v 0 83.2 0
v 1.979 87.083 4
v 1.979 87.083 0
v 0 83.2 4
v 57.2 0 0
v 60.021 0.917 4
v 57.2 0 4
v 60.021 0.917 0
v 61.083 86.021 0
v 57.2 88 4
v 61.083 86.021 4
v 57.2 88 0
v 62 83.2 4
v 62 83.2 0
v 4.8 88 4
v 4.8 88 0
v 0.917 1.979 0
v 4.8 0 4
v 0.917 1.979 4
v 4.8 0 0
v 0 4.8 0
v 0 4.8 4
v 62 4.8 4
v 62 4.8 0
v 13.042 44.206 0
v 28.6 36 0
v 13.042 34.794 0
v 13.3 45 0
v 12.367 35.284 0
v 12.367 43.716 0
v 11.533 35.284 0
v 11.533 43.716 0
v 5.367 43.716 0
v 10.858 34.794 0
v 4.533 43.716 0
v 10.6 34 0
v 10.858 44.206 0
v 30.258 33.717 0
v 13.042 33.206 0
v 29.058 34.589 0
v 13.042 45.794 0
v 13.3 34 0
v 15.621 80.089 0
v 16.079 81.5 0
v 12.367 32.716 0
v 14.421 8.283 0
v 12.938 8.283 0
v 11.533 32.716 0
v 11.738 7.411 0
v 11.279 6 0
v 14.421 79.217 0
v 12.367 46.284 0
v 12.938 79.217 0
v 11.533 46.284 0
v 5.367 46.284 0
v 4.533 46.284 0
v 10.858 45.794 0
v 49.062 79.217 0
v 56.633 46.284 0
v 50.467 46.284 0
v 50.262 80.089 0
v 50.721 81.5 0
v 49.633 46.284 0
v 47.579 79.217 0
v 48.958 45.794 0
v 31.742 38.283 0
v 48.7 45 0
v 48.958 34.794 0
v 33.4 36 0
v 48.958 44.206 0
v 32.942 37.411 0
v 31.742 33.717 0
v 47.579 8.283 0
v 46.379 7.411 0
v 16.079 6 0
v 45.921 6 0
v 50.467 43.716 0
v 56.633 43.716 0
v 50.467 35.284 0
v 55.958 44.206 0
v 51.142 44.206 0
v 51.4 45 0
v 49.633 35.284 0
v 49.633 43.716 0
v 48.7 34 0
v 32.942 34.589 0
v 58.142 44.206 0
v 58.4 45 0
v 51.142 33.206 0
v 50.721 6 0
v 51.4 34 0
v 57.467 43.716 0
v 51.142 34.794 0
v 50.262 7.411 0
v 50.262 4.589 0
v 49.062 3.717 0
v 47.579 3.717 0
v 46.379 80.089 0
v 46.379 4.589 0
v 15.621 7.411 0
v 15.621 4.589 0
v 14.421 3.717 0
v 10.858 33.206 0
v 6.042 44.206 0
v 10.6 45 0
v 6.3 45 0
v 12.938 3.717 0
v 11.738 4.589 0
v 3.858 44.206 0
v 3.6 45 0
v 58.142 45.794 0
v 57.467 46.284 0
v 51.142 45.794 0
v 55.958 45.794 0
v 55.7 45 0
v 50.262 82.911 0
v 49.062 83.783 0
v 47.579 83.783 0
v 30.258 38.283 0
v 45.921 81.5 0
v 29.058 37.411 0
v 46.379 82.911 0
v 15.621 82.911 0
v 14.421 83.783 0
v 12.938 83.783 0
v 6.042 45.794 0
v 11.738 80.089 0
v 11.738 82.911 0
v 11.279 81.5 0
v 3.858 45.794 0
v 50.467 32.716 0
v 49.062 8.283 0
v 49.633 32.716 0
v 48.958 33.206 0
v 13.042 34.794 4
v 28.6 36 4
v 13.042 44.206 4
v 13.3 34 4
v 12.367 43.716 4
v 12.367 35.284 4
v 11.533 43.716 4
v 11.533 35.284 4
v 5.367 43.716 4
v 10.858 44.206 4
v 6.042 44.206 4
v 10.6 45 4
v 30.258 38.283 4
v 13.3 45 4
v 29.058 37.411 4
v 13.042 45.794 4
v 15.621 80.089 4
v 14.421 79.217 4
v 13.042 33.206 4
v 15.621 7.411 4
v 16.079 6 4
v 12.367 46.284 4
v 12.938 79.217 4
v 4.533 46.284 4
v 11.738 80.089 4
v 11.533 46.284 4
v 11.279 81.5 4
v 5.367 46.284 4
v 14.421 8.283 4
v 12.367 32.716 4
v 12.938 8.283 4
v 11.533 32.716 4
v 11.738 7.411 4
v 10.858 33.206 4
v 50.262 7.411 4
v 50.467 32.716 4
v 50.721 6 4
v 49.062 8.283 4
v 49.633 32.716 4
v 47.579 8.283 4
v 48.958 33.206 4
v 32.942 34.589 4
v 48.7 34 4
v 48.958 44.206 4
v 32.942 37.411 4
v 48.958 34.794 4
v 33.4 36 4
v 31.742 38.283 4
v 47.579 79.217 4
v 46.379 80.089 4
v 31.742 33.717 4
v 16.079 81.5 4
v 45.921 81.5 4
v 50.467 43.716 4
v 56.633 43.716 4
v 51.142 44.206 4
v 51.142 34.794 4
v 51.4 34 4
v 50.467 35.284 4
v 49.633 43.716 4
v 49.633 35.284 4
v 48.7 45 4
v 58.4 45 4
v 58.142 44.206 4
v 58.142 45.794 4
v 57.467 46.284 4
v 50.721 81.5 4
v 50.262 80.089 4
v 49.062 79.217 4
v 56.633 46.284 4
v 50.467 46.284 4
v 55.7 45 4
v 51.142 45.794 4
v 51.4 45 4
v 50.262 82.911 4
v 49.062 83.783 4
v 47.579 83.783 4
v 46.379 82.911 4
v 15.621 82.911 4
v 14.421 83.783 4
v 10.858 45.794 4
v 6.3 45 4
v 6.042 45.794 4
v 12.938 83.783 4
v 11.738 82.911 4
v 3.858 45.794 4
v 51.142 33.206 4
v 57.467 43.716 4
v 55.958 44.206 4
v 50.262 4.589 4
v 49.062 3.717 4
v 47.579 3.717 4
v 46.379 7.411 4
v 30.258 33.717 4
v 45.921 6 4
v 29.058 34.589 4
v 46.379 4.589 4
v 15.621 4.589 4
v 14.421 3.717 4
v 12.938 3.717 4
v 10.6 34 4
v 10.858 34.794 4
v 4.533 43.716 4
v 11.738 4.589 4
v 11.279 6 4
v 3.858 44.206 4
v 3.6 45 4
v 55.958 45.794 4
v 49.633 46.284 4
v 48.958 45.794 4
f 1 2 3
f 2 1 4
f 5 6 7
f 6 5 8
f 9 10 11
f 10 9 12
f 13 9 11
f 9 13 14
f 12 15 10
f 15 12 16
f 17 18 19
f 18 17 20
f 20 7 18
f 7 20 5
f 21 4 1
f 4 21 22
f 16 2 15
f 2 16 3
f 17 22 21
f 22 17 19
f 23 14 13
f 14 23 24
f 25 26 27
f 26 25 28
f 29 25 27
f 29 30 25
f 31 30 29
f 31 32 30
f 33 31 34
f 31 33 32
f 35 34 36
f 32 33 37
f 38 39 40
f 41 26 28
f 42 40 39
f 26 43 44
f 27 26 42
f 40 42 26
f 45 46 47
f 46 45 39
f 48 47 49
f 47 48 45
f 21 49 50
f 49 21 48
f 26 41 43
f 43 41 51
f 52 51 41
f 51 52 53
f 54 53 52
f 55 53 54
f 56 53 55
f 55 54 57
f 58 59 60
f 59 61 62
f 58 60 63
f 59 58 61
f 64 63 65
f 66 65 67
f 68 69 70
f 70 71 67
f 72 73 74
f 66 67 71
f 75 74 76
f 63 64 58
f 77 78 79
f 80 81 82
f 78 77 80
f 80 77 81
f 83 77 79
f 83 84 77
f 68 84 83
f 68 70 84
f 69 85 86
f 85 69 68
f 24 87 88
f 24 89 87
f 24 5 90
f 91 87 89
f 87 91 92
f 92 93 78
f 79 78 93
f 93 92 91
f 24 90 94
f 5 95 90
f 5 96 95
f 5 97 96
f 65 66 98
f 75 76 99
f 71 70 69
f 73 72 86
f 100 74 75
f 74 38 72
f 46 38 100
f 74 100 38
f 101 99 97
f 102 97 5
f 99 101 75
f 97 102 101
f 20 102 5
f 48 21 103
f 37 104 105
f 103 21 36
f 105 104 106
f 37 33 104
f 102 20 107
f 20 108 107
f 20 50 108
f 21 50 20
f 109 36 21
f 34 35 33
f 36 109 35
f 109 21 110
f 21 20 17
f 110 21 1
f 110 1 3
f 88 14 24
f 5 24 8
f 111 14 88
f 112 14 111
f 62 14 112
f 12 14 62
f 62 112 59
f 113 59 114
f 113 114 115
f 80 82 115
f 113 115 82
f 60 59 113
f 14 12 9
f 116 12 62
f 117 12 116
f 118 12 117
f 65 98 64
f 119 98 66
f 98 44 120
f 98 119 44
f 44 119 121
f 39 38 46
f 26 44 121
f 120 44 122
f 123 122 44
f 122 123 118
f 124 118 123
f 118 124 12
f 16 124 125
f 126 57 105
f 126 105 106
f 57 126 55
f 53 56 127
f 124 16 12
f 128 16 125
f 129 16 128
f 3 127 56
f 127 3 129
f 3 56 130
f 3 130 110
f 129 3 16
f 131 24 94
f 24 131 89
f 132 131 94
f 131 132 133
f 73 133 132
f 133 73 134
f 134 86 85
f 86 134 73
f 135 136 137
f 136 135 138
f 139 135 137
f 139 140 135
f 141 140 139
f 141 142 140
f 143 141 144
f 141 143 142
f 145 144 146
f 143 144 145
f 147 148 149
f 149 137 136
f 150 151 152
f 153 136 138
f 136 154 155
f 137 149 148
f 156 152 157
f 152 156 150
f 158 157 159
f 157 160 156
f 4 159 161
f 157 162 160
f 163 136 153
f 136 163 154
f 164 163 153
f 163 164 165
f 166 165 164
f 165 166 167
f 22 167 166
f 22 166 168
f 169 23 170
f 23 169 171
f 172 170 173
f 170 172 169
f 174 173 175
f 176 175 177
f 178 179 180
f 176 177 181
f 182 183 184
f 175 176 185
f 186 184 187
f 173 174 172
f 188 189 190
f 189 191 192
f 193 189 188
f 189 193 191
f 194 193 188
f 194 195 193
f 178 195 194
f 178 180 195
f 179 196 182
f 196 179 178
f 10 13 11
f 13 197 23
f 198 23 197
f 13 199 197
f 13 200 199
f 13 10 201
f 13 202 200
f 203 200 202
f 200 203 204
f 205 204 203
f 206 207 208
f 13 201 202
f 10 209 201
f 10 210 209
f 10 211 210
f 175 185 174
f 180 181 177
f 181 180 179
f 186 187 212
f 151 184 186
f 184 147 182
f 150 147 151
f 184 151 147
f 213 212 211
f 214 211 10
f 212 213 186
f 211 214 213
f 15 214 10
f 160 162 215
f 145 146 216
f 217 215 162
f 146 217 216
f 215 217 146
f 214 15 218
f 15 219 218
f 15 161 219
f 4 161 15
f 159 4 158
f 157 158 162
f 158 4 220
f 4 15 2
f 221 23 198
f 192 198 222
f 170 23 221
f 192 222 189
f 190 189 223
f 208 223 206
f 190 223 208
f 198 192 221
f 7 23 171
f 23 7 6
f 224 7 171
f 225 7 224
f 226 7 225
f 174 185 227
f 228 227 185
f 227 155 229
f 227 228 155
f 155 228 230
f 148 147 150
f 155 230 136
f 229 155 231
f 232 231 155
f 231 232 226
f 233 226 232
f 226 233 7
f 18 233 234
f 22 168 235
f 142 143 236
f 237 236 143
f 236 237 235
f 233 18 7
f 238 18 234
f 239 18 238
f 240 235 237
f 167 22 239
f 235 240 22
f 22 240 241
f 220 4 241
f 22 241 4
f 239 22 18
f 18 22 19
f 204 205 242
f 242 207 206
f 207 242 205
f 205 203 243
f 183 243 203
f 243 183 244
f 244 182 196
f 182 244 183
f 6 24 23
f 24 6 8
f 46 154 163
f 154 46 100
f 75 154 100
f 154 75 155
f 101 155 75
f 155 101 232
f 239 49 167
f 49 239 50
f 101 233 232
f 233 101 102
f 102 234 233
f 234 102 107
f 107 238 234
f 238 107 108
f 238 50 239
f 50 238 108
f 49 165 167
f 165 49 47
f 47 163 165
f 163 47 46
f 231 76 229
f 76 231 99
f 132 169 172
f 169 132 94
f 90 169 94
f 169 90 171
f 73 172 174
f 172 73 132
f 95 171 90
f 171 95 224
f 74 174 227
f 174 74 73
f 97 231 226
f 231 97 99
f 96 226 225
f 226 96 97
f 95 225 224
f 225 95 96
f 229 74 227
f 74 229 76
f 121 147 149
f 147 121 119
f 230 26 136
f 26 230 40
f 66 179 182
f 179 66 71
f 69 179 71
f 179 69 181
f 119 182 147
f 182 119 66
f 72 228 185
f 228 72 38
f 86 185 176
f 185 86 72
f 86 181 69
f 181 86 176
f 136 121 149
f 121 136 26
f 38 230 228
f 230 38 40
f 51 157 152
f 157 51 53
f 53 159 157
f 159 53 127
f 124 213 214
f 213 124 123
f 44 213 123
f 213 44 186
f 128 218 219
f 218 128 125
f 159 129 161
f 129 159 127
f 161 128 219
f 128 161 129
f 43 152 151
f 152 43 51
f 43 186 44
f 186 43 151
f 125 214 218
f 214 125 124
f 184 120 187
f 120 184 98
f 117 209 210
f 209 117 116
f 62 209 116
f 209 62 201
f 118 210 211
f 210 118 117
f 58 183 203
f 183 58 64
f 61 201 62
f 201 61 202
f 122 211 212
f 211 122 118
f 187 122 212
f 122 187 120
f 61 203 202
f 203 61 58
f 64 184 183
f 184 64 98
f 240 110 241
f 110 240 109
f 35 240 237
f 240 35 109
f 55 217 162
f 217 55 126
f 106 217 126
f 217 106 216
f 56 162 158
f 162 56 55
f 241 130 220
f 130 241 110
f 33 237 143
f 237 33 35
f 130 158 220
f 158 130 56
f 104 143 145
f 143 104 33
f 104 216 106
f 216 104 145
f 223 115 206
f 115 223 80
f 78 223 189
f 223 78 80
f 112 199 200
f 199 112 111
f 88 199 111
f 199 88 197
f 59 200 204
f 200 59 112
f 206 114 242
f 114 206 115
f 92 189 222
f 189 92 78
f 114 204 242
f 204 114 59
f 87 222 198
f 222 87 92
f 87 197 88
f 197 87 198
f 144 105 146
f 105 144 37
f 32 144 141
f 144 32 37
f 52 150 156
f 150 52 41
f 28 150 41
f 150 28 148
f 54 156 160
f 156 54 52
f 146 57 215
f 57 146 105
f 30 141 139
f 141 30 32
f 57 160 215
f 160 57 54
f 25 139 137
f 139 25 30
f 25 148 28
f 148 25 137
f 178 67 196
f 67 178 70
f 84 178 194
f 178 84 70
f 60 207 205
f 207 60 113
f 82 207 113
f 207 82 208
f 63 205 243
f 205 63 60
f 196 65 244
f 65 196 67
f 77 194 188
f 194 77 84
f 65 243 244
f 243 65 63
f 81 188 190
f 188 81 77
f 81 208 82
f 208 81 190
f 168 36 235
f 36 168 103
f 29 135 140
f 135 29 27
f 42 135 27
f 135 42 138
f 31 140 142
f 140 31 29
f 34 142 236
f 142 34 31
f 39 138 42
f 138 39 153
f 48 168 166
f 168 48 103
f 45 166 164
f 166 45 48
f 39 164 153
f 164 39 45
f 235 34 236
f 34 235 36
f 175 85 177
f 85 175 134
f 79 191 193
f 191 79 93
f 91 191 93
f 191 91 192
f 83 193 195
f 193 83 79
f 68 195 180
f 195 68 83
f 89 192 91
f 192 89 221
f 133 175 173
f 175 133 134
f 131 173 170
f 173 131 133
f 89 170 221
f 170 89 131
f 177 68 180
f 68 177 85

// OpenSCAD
// Set to 'preview' while changing paramters. Set to 'create' before clicking 'Create Thing'. Rendering will fail (timeout will be displayed), but export will work!
create_thing=0; // [0:preview, 1:create]

// center distance of the wheels
wheeldistance=30;

// center distance of the rods.
roddistance=45.5;

// CR10/mk8 mounting block
include_CR10_mount = 0; // [0:no, 1:yes]
// BLTouch mount
include_BLTouch = 0; // [0:no, 1:yes]
// E3D mount
include_E3D_mount = 0; // [0:no, 1:yes]
// Add a sensor holder to the carriage (if activated: print with support advised!) - ATTENTION: Depending on the position of your sensor holder, it may interfere with other components (e.g. cooling fan of hotend, cable chain, ...) -> Based on this fact, the sensor holder on the back of the carriage is still the recommended version (links can be found in the thing-description.)
include_sensor_holder = 0; // [0:no, 1:yes]
// E3D side fan holder
include_fan_holder = 0; // [0:no, 1:yes]

/* [Hidden] */

plate=1;
beltholder=2;
full=3;

view=1;

$fn= create_thing?50:10;

width=62;
height=88;
thickness_backplate=4;

/* [CR10-mount] */

// left/right on plate
mount_x=-20.5; // [-30:-10]
// up/down on plate
mount_y=16;    // [10:20]
// depth(height) of the mounting block
mount_depth=6; // [5:10]

/* [BLTouch] */

// left/right on plate
sensor_x=20.5;       // [10:30]
// up/down on plate
sensor_y=16;         // [10:20]

/* [E3D-mount] */

// X-Offset of hotend mounting point in mm (0mm recommended)
x_offset_hotend = 0;  // [-8:0.1:8]

// Total height of hotend (top to nozzle tip) in mm (E3Dv6: ~63mm, Some Clones: ~74mm)
hotend_height = 63; // [60:85]

/* [Fan-Holder] */

// Zip tie hole on fan holder
zip_tie_hole_fan_holder = 1; // [0:no, 1:yes]

// Fan holder offset in z-direction in mm (printer coordinate system - up/down)
z_offset_fan_holder = 0;  // [-3:0.1:10]

// Fan holder offset in x-direction in mm (printer coordinate system - left/right)
x_offset_fan_holder = 0;  // [-10:0.1:3]

// Fan holder offset in y-direction in mm (printer coordinate system - back/forth)
y_offset_fan_holder = 0; // [-10:0.1:6]

/* [Sensor-Holder] */

// X-Offset of sensor holder mounting point in mm (>0mm recommended)
x_offset_sensor = 0; // [-8:0.1:20]

// Y-Offset of sensor holder mounting point in mm (0mm recommended)
y_offset_sensor = 0; // [-2:0.1:20]

// Z-Offset of sensor holder mounting point in mm
z_offset_sensor = 0; // [-12:0.1:15]

// Select your sensor diameter (Most common: M18, M12, M8)
sensor_diameter = 18; //[6:1:20]

// Height/thickness of the sensor holder (default: 8mm)
sensor_holder_height = 8; //[5:0.1:20]

// Thickness of the wall surrounding the sensor (default: 4mm)
sensor_holder_wall_thickness = 4;  //[2:0.1:10]

/* [Hidden] */

left=-15*sqrt(4/3);
right=15*sqrt(4/3);
bottom=-height/2+6;
radius=2.4+0;


mountx=mount_x;
mounty=mount_y+bottom;
mountdepth=mount_depth;

sensorx=sensor_x;
sensory=sensor_y+bottom;

translate([width/2,height/2,0])
  union() {
    if(view==plate || view==full)
    {
     difference() {
      union() {
          Plate();
          if(include_CR10_mount)
            MountingpointCR10(mountx,mounty,mountdepth);
          if(include_BLTouch)
            sensorHolderBLTouch(sensorx, sensory);
      }
      BeltHoles();
      if(include_CR10_mount)
        MountingpointCR10Holes(mountx,mounty,mountdepth);
     }
    }
    
    
    if(view==beltholder || view==full) {
     flip = view==beltholder ? 0:180;
     rotate([0,flip,0]) {
      union() {
       translate([0,bottom+25+9,-6])
        difference() {
          // https://www.thingiverse.com/thing:2174995/
          import("Anet_a8_gt2_X_belt.stl");
        
         cube([100,20,12],center=true);
         cube([31,20,40],center=true);
        }
       translate([-23,bottom+15+7,4])
        cube([15,2,8],center=true);
       translate([-23,bottom+15+9,1])
        cube([15,4,2],center=true);
    
       translate([+23,bottom+15+7,4])
        cube([15,2,8],center=true);
       translate([+23,bottom+15+9,1])
        cube([15,4,2],center=true);
      }
     }
    }
    
    
    if(view==full) {
        bearings();
        rods();
    }

  }

// Merge z offset fan and hotend length
z_offset_fan_holder_merge = (74-hotend_height) + z_offset_fan_holder;

if(include_E3D_mount)
  MountingpointE3D(16+x_offset_hotend,37.24,13.75);

if(include_fan_holder)
  FanHolder2(x_offset_fan_holder-3,z_offset_fan_holder_merge, -y_offset_fan_holder);

if(include_sensor_holder)
                sensorHolder(65+x_offset_sensor,25+z_offset_sensor,20+y_offset_sensor,sensor_diameter,sensor_holder_height,sensor_holder_wall_thickness);
 


module Plate() {
difference() {
 linear_extrude(thickness_backplate) {
  offset(r=+2*radius)
   offset(r=-2*radius)
    square([width, height], center=true);
  }

  // lower bearings holes
   translate([left,bottom,0])
   cylinder(h=thickness_backplate,r=radius);
   translate([right,bottom,0])
   cylinder(h=thickness_backplate,r=radius);
   translate([0,bottom+wheeldistance,0])
   cylinder(h=thickness_backplate,r=radius);
  // upper bearings holes
   translate([left,bottom+wheeldistance+roddistance,0])
   cylinder(h=thickness_backplate,r=radius);
   translate([right,bottom+wheeldistance+roddistance,0])
   cylinder(h=thickness_backplate,r=radius);
 }
}

beltholex=19.05;
beltholex2=26.05;
beltholetop=bottom+39;
beltholebottom=bottom+28;

module BeltHoles() {
  translate([-beltholex2,beltholetop,0])
    cylinder(h=thickness_backplate, r=2.7/2);
  translate([+beltholex2,beltholetop,0])
    cylinder(h=thickness_backplate, r=2.7/2);

  translate([-beltholex,beltholetop,0])
    cylinder(h=thickness_backplate, r=2.7/2);
  translate([+beltholex,beltholetop,0])
    cylinder(h=thickness_backplate, r=2.7/2);

  translate([-beltholex,beltholebottom,0])
    cylinder(h=thickness_backplate, r=2.7/2);
  translate([+beltholex,beltholebottom,0])
    cylinder(h=thickness_backplate, r=2.7/2);
}

module MountingpointCR10(x_pos,y_pos,dh){
    width = 20;
    height = 6;
    holes_distance = 13.7;
    translate([x_pos,y_pos,0])
            cube([width,height,dh+thickness_backplate],
                center=false);
}
module MountingpointCR10Holes(x_pos,y_pos,dh){
    width = 20;
    height = 6;
    holes_distance = 13.7;
    translate([x_pos,y_pos,0]) {
        // Screw holes
        translate([width/2-holes_distance/2,height/2,0]){
        cylinder(h=dh+thickness_backplate, r=3/2, center=false);
        }

        translate([width/2+holes_distance/2,height/2,0]){    
        cylinder(h=dh+thickness_backplate, r=3/2, center=false); 
        }
    }
}

module sensorHolderBLTouch(x,y){
    width = 10;
    height = 3;
    depth = 28;
    holes_distance = 18;
    translate([x,y,thickness_backplate-0.01])
    difference(){  
        union()
        {
            cube([width,height,depth], center=false);  
            translate([width*.05,depth*.6,-height])
            rotate([34,0,0])
            cube([width*.9,height,depth*1.05], center=false);
        }
        
        // Screw holes
        translate([width/2,height, 2.0+depth/2-holes_distance/2]){
            rotate([-90,0,0]) {    
                cylinder(h=height*10, r=3/2, center=true);
                translate([0,0,height])
                cylinder(h=height*4,r=5/2, center=false);
            }
        }
        
        translate([width/2,height, 2.0+depth/2+holes_distance/2]){
            rotate([90,0,0])
                cylinder(h=height*10, r=3/2, center=true); 
        }
        
        // Adjustmenthole
        translate([width/2,height, 2.0+depth/2]){
            rotate([90,0,0])
                cylinder(h=height*10, r=5/2, center=true);
        }
    } 

}

module bearings() {
  z=-5.5-1;
  color("grey") {
    bearing(left,  bottom, z, 0, 0);
    bearing(right, bottom, z, 0, 0);
    bearing(0, bottom+wheeldistance, z, 0, 0);

    bearing(left,  bottom+wheeldistance+roddistance, z, 0, 0);
    bearing(right, bottom+wheeldistance+roddistance, z, 0, 0);
  }
}

module bearing(x,y,z, rx, ry) {
 translate([x,y,z])
  rotate([rx,ry,0])
   rotate_extrude($fn=50)
    polygon( points=[
        [2.5, 11/2],
        [20/2, 11/2],
        [24.5/2, 5.5/2],
        [20/2, 0],
        [24.5/2, -5.5/2],
        [20/2, -11/2],
        [2.5, -11/2],
       ] );
}

module rods() {
    color("red") {
      translate([0,bottom+wheeldistance/2,-5.5-1])
      rotate([0,90,0])
        cylinder(d=8, h=100, center=true);
      translate([0,bottom+wheeldistance/2+roddistance,-5.5-1])
      rotate([0,90,0])
        cylinder(d=8, h=100, center=true);
    }
}


module FanHolder2(offset_x, offset_y, offset_z){  
thickness = 6;  
y_lower_screw = 9.5;
z_lower_screw = 62.5;    
  
difference(){  
    
translate([offset_x-0.1, offset_y, offset_z])    
difference(){
    
    union(){
    difference(){
    union(){
        hull(){
        FanHolder_Shape([0,0,0],thickness,1,7.5,7.5,offset_y>=9.5? offset_y-9.5 : 0);
        }
        
        // Support
        FanHolder_Support();
    }
    
    hull(){
    FanHolder_Shape([0-0.1,6,-15],thickness+0.2,0.1,2,10,30);
    }
    }

    // Rounded inner edge
    inner_radius = 1;
    
    FanHolder_Shape([0,6,-15],thickness,inner_radius,3,10,30);
    
   // infill between rounded edges 
    translate([inner_radius,0,0]) rotate([0,90,0]) linear_extrude(height = thickness-inner_radius*2) projection() rotate([0,-90,0]) FanHolder_Shape([0,6,-15],thickness,inner_radius,3,10,30);
    
    }
    
    // Add screw holes
    translate([-0.1,y_lower_screw,z_lower_screw])
    rotate([0,90,0])
    cylinder(h=thickness+0.2, r=1.25);
    
    translate([-0.1,y_lower_screw+41,z_lower_screw-41])
    rotate([0,90,0])
    cylinder(h=thickness+0.2, r=1.25);
    
    // Zip tie hole fan holder
    if(zip_tie_hole_fan_holder){
        hull(){
        translate([-0.1,65,13])
        rotate([0,90,0])
        cylinder(h=thickness+0.2, r=0.75);
     
        translate([-0.1,65-2.7,13+2.7])
        rotate([0,90,0])
        cylinder(h=thickness+0.2, r=0.75);
        }
    }    
    

}

    // Cut too long bottom elements
    translate([-500,-500,-500]) cube([1000,1000,500]);
}
}

module FanHolder_Support(){
    thickness = 3;
    width = 10;

    translate([0,0.3,0])
    difference(){
    union(){
    difference(){
    
        union(){
            hull(){
            translate([28,5,-33])
            rotate([0,-14,0])
            cylinder(h=100, r=thickness/2);
            
            translate([28,5+width-thickness,-33])
            rotate([0,-14,0])
            cylinder(h=100, r=thickness/2);
            }
            
            translate([4.6,5-thickness/2,40])
            rotate([0,-14,0])
            cube([5,width,15], centering=false);
        }
        
        difference(){
        translate([7,1,40])
        rotate([-90,0,0])
        cylinder(h=width+5, r=2.9);
            
        translate([7,1,30])
        rotate([0,-14,0])
        cube([10,width+5,10], centering=false);    
        }
    }
    
    angle2 = 180;
    angle1 = 14;
    
    start = 5;
    end = 5+width-thickness;
    
    for(y_stop = [start , end])
    {
        // bend
        translate([7,y_stop,40])
        rotate([90,0,0])
        difference()
        {
        // torus
        rotate_extrude()
        translate([1.2 + thickness/2, 0, 0])
        circle(r=thickness/2);
        // lower cutout
        rotate([0, 0, angle1])
        translate([-50 * (((angle2 - angle1) <= 180)?1:0), -100, -50])
        cube([100, 100, 100]);
        // upper cutout
        rotate([0, 0, angle2])
        translate([-50 * (((angle2 - angle1) <= 180)?1:0), 0, -50])
        cube([100, 100, 100]);
        }
    }
    
    
    // infill between rounded edges 
    translate([0,5,0]) rotate([-90,0,0]) linear_extrude(height = width-thickness/2*2) projection() rotate([90,0,0]) 
    {
        // bend
        translate([7,start,40])
        rotate([90,0,0])
        difference()
        {
        // torus
        rotate_extrude()
        translate([1.2 + thickness/2, 0, 0])
        circle(r=thickness/2);
        // lower cutout
        rotate([0, 0, angle1])
        translate([-50 * (((angle2 - angle1) <= 180)?1:0), -100, -50])
        cube([100, 100, 100]);
        // upper cutout
        rotate([0, 0, angle2])
        translate([-50 * (((angle2 - angle1) <= 180)?1:0), 0, -50])
        cube([100, 100, 100]);
        }
    };
    
    
    
    
    
}
translate([-4.2,0,0])
cube([10,20,100]);
}
}

module FanHolder_Shape(offset,thickness,radius,bend1,bend2,reduceHeight = 0){

bend_radius = bend1 - radius*2;   
bend_radius2 = bend2 - radius*2;     
    
// Leave like this   
angle_1 = 0;
angle_2 = 135;
angle_3 = 180;
length_1 =75;
length_2 =80-(reduceHeight/cos(angle_2-90));
length_3 =20+reduceHeight;

start = (0+radius);
end  = (thickness-radius);

union(){
for(x_stop = [start , end])
{
translate([offset[0]+x_stop,10+offset[1],60+offset[2]])    
rotate([90,0,-90])    
union() {
// lower arm
rotate([0, 0, angle_1])
translate([bend_radius + radius, 0.02, 0])
rotate([90, 0, 0])
cylinder(r=radius, h=length_1+0.04);

// middle arm
rotate([0, 0, angle_2])
translate([bend_radius + radius, -0.02, 0])
rotate([-90, 0, 0])
cylinder(r=radius, h=length_2+0.04);

// upper arm
translate([-sin(angle_2)*length_2+ cos(angle_2)*(bend_radius - bend_radius2),cos(angle_2)*length_2+ sin(angle_2)*(bend_radius - bend_radius2),0])
rotate([0, 0, angle_3])
translate([bend_radius2 + radius, -0.02, 0])
rotate([-90, 0, 0])
cylinder(r=radius, h=length_3+0.04);
// bend
difference()
{
// torus
rotate_extrude()
translate([bend_radius + radius, 0, 0])
circle(r=radius);
// lower cutout
rotate([0, 0, angle_1])
translate([-50 * (((angle_2 - angle_1) <= 180)?1:0), -100, -50])
cube([100, 100, 100]);
// upper cutout
rotate([0, 0, angle_2])
translate([-50 * (((angle_2 - angle_1) <= 180)?1:0), 0, -50])
cube([100, 100, 100]);
}

// bend2
translate([-sin(angle_2)*length_2 + cos(angle_2)*(bend_radius - bend_radius2),cos(angle_2)*length_2 + sin(angle_2)*(bend_radius - bend_radius2),0])
difference()
{
// torus
rotate_extrude()
translate([bend_radius2 + radius, 0, 0])
circle(r=radius);
// lower cutout
rotate([0, 0, angle_2])
translate([-50 * (((angle_3 - angle_2) <= 180)?1:0), -100, -50])
cube([100, 100, 100]);
// upper cutout
rotate([0, 0, angle_3])
translate([-50 * (((angle_3 - angle_2) <= 180)?1:0), 0, -50])
cube([100, 100, 100]);

}
}
}
}   
}

module MountingpointE3D(x_pos,y_pos,dh){
    width = 30;
    height = 12.68;
    height_upper_ring_hotend = 3.8;
    height_ring_rinse = 5.88;
    
    translate([x_pos,y_pos,thickness_backplate-0.01])
    difference(){  
        union()
        {            
            cube([width,height,dh], center=false);  
        }
        
        // Screw holes
        translate([4,height/2,0.1])    
   cylinder(h=dh, r=2.83/2, center=false); 
        
        translate([width-4,height/2,0.1])    
   cylinder(h=dh, r=2.83/2, center=false); 
        
        // Mounting clip
        translate([width/2,-1,dh]) 
        rotate([-90,0,0])
   cylinder(h=height-height_ring_rinse-height_upper_ring_hotend+1, r=8.17, center=false); 
        
        translate([width/2,height-height_upper_ring_hotend,dh]) 
        rotate([-90,0,0])
   cylinder(h=height_upper_ring_hotend+1, r=8.17, center=false);
        
        translate([width/2,-1,dh]) 
        rotate([-90,0,0])
   cylinder(h=height+2, r=6, center=false); 
    } 
}

///

module sensorHolder(x,y,z,dia,thickness,wall){
    
    difference(){
        union(){
            hull(){
                translate([x,y,z])
                    rotate([90,0,0])
                        cylinder(r=dia/2+wall, h=thickness);   
                
                // Position on left in carriage
                translate([50,y,wall/2+0.1])
                    rotate([90,0,0])
                        cylinder(r=wall/2, h=thickness);
            
                // Position on right in carriage
                translate([60,y,wall/2+0.1])
                    rotate([90,0,0])
                        cylinder(r=wall/2, h=thickness);
                
            }
        }
        
        translate([x,y+1,z])
                rotate([90,0,0])
                    cylinder(r=dia/2, h=thickness+2);
        
        
    }
    
}
